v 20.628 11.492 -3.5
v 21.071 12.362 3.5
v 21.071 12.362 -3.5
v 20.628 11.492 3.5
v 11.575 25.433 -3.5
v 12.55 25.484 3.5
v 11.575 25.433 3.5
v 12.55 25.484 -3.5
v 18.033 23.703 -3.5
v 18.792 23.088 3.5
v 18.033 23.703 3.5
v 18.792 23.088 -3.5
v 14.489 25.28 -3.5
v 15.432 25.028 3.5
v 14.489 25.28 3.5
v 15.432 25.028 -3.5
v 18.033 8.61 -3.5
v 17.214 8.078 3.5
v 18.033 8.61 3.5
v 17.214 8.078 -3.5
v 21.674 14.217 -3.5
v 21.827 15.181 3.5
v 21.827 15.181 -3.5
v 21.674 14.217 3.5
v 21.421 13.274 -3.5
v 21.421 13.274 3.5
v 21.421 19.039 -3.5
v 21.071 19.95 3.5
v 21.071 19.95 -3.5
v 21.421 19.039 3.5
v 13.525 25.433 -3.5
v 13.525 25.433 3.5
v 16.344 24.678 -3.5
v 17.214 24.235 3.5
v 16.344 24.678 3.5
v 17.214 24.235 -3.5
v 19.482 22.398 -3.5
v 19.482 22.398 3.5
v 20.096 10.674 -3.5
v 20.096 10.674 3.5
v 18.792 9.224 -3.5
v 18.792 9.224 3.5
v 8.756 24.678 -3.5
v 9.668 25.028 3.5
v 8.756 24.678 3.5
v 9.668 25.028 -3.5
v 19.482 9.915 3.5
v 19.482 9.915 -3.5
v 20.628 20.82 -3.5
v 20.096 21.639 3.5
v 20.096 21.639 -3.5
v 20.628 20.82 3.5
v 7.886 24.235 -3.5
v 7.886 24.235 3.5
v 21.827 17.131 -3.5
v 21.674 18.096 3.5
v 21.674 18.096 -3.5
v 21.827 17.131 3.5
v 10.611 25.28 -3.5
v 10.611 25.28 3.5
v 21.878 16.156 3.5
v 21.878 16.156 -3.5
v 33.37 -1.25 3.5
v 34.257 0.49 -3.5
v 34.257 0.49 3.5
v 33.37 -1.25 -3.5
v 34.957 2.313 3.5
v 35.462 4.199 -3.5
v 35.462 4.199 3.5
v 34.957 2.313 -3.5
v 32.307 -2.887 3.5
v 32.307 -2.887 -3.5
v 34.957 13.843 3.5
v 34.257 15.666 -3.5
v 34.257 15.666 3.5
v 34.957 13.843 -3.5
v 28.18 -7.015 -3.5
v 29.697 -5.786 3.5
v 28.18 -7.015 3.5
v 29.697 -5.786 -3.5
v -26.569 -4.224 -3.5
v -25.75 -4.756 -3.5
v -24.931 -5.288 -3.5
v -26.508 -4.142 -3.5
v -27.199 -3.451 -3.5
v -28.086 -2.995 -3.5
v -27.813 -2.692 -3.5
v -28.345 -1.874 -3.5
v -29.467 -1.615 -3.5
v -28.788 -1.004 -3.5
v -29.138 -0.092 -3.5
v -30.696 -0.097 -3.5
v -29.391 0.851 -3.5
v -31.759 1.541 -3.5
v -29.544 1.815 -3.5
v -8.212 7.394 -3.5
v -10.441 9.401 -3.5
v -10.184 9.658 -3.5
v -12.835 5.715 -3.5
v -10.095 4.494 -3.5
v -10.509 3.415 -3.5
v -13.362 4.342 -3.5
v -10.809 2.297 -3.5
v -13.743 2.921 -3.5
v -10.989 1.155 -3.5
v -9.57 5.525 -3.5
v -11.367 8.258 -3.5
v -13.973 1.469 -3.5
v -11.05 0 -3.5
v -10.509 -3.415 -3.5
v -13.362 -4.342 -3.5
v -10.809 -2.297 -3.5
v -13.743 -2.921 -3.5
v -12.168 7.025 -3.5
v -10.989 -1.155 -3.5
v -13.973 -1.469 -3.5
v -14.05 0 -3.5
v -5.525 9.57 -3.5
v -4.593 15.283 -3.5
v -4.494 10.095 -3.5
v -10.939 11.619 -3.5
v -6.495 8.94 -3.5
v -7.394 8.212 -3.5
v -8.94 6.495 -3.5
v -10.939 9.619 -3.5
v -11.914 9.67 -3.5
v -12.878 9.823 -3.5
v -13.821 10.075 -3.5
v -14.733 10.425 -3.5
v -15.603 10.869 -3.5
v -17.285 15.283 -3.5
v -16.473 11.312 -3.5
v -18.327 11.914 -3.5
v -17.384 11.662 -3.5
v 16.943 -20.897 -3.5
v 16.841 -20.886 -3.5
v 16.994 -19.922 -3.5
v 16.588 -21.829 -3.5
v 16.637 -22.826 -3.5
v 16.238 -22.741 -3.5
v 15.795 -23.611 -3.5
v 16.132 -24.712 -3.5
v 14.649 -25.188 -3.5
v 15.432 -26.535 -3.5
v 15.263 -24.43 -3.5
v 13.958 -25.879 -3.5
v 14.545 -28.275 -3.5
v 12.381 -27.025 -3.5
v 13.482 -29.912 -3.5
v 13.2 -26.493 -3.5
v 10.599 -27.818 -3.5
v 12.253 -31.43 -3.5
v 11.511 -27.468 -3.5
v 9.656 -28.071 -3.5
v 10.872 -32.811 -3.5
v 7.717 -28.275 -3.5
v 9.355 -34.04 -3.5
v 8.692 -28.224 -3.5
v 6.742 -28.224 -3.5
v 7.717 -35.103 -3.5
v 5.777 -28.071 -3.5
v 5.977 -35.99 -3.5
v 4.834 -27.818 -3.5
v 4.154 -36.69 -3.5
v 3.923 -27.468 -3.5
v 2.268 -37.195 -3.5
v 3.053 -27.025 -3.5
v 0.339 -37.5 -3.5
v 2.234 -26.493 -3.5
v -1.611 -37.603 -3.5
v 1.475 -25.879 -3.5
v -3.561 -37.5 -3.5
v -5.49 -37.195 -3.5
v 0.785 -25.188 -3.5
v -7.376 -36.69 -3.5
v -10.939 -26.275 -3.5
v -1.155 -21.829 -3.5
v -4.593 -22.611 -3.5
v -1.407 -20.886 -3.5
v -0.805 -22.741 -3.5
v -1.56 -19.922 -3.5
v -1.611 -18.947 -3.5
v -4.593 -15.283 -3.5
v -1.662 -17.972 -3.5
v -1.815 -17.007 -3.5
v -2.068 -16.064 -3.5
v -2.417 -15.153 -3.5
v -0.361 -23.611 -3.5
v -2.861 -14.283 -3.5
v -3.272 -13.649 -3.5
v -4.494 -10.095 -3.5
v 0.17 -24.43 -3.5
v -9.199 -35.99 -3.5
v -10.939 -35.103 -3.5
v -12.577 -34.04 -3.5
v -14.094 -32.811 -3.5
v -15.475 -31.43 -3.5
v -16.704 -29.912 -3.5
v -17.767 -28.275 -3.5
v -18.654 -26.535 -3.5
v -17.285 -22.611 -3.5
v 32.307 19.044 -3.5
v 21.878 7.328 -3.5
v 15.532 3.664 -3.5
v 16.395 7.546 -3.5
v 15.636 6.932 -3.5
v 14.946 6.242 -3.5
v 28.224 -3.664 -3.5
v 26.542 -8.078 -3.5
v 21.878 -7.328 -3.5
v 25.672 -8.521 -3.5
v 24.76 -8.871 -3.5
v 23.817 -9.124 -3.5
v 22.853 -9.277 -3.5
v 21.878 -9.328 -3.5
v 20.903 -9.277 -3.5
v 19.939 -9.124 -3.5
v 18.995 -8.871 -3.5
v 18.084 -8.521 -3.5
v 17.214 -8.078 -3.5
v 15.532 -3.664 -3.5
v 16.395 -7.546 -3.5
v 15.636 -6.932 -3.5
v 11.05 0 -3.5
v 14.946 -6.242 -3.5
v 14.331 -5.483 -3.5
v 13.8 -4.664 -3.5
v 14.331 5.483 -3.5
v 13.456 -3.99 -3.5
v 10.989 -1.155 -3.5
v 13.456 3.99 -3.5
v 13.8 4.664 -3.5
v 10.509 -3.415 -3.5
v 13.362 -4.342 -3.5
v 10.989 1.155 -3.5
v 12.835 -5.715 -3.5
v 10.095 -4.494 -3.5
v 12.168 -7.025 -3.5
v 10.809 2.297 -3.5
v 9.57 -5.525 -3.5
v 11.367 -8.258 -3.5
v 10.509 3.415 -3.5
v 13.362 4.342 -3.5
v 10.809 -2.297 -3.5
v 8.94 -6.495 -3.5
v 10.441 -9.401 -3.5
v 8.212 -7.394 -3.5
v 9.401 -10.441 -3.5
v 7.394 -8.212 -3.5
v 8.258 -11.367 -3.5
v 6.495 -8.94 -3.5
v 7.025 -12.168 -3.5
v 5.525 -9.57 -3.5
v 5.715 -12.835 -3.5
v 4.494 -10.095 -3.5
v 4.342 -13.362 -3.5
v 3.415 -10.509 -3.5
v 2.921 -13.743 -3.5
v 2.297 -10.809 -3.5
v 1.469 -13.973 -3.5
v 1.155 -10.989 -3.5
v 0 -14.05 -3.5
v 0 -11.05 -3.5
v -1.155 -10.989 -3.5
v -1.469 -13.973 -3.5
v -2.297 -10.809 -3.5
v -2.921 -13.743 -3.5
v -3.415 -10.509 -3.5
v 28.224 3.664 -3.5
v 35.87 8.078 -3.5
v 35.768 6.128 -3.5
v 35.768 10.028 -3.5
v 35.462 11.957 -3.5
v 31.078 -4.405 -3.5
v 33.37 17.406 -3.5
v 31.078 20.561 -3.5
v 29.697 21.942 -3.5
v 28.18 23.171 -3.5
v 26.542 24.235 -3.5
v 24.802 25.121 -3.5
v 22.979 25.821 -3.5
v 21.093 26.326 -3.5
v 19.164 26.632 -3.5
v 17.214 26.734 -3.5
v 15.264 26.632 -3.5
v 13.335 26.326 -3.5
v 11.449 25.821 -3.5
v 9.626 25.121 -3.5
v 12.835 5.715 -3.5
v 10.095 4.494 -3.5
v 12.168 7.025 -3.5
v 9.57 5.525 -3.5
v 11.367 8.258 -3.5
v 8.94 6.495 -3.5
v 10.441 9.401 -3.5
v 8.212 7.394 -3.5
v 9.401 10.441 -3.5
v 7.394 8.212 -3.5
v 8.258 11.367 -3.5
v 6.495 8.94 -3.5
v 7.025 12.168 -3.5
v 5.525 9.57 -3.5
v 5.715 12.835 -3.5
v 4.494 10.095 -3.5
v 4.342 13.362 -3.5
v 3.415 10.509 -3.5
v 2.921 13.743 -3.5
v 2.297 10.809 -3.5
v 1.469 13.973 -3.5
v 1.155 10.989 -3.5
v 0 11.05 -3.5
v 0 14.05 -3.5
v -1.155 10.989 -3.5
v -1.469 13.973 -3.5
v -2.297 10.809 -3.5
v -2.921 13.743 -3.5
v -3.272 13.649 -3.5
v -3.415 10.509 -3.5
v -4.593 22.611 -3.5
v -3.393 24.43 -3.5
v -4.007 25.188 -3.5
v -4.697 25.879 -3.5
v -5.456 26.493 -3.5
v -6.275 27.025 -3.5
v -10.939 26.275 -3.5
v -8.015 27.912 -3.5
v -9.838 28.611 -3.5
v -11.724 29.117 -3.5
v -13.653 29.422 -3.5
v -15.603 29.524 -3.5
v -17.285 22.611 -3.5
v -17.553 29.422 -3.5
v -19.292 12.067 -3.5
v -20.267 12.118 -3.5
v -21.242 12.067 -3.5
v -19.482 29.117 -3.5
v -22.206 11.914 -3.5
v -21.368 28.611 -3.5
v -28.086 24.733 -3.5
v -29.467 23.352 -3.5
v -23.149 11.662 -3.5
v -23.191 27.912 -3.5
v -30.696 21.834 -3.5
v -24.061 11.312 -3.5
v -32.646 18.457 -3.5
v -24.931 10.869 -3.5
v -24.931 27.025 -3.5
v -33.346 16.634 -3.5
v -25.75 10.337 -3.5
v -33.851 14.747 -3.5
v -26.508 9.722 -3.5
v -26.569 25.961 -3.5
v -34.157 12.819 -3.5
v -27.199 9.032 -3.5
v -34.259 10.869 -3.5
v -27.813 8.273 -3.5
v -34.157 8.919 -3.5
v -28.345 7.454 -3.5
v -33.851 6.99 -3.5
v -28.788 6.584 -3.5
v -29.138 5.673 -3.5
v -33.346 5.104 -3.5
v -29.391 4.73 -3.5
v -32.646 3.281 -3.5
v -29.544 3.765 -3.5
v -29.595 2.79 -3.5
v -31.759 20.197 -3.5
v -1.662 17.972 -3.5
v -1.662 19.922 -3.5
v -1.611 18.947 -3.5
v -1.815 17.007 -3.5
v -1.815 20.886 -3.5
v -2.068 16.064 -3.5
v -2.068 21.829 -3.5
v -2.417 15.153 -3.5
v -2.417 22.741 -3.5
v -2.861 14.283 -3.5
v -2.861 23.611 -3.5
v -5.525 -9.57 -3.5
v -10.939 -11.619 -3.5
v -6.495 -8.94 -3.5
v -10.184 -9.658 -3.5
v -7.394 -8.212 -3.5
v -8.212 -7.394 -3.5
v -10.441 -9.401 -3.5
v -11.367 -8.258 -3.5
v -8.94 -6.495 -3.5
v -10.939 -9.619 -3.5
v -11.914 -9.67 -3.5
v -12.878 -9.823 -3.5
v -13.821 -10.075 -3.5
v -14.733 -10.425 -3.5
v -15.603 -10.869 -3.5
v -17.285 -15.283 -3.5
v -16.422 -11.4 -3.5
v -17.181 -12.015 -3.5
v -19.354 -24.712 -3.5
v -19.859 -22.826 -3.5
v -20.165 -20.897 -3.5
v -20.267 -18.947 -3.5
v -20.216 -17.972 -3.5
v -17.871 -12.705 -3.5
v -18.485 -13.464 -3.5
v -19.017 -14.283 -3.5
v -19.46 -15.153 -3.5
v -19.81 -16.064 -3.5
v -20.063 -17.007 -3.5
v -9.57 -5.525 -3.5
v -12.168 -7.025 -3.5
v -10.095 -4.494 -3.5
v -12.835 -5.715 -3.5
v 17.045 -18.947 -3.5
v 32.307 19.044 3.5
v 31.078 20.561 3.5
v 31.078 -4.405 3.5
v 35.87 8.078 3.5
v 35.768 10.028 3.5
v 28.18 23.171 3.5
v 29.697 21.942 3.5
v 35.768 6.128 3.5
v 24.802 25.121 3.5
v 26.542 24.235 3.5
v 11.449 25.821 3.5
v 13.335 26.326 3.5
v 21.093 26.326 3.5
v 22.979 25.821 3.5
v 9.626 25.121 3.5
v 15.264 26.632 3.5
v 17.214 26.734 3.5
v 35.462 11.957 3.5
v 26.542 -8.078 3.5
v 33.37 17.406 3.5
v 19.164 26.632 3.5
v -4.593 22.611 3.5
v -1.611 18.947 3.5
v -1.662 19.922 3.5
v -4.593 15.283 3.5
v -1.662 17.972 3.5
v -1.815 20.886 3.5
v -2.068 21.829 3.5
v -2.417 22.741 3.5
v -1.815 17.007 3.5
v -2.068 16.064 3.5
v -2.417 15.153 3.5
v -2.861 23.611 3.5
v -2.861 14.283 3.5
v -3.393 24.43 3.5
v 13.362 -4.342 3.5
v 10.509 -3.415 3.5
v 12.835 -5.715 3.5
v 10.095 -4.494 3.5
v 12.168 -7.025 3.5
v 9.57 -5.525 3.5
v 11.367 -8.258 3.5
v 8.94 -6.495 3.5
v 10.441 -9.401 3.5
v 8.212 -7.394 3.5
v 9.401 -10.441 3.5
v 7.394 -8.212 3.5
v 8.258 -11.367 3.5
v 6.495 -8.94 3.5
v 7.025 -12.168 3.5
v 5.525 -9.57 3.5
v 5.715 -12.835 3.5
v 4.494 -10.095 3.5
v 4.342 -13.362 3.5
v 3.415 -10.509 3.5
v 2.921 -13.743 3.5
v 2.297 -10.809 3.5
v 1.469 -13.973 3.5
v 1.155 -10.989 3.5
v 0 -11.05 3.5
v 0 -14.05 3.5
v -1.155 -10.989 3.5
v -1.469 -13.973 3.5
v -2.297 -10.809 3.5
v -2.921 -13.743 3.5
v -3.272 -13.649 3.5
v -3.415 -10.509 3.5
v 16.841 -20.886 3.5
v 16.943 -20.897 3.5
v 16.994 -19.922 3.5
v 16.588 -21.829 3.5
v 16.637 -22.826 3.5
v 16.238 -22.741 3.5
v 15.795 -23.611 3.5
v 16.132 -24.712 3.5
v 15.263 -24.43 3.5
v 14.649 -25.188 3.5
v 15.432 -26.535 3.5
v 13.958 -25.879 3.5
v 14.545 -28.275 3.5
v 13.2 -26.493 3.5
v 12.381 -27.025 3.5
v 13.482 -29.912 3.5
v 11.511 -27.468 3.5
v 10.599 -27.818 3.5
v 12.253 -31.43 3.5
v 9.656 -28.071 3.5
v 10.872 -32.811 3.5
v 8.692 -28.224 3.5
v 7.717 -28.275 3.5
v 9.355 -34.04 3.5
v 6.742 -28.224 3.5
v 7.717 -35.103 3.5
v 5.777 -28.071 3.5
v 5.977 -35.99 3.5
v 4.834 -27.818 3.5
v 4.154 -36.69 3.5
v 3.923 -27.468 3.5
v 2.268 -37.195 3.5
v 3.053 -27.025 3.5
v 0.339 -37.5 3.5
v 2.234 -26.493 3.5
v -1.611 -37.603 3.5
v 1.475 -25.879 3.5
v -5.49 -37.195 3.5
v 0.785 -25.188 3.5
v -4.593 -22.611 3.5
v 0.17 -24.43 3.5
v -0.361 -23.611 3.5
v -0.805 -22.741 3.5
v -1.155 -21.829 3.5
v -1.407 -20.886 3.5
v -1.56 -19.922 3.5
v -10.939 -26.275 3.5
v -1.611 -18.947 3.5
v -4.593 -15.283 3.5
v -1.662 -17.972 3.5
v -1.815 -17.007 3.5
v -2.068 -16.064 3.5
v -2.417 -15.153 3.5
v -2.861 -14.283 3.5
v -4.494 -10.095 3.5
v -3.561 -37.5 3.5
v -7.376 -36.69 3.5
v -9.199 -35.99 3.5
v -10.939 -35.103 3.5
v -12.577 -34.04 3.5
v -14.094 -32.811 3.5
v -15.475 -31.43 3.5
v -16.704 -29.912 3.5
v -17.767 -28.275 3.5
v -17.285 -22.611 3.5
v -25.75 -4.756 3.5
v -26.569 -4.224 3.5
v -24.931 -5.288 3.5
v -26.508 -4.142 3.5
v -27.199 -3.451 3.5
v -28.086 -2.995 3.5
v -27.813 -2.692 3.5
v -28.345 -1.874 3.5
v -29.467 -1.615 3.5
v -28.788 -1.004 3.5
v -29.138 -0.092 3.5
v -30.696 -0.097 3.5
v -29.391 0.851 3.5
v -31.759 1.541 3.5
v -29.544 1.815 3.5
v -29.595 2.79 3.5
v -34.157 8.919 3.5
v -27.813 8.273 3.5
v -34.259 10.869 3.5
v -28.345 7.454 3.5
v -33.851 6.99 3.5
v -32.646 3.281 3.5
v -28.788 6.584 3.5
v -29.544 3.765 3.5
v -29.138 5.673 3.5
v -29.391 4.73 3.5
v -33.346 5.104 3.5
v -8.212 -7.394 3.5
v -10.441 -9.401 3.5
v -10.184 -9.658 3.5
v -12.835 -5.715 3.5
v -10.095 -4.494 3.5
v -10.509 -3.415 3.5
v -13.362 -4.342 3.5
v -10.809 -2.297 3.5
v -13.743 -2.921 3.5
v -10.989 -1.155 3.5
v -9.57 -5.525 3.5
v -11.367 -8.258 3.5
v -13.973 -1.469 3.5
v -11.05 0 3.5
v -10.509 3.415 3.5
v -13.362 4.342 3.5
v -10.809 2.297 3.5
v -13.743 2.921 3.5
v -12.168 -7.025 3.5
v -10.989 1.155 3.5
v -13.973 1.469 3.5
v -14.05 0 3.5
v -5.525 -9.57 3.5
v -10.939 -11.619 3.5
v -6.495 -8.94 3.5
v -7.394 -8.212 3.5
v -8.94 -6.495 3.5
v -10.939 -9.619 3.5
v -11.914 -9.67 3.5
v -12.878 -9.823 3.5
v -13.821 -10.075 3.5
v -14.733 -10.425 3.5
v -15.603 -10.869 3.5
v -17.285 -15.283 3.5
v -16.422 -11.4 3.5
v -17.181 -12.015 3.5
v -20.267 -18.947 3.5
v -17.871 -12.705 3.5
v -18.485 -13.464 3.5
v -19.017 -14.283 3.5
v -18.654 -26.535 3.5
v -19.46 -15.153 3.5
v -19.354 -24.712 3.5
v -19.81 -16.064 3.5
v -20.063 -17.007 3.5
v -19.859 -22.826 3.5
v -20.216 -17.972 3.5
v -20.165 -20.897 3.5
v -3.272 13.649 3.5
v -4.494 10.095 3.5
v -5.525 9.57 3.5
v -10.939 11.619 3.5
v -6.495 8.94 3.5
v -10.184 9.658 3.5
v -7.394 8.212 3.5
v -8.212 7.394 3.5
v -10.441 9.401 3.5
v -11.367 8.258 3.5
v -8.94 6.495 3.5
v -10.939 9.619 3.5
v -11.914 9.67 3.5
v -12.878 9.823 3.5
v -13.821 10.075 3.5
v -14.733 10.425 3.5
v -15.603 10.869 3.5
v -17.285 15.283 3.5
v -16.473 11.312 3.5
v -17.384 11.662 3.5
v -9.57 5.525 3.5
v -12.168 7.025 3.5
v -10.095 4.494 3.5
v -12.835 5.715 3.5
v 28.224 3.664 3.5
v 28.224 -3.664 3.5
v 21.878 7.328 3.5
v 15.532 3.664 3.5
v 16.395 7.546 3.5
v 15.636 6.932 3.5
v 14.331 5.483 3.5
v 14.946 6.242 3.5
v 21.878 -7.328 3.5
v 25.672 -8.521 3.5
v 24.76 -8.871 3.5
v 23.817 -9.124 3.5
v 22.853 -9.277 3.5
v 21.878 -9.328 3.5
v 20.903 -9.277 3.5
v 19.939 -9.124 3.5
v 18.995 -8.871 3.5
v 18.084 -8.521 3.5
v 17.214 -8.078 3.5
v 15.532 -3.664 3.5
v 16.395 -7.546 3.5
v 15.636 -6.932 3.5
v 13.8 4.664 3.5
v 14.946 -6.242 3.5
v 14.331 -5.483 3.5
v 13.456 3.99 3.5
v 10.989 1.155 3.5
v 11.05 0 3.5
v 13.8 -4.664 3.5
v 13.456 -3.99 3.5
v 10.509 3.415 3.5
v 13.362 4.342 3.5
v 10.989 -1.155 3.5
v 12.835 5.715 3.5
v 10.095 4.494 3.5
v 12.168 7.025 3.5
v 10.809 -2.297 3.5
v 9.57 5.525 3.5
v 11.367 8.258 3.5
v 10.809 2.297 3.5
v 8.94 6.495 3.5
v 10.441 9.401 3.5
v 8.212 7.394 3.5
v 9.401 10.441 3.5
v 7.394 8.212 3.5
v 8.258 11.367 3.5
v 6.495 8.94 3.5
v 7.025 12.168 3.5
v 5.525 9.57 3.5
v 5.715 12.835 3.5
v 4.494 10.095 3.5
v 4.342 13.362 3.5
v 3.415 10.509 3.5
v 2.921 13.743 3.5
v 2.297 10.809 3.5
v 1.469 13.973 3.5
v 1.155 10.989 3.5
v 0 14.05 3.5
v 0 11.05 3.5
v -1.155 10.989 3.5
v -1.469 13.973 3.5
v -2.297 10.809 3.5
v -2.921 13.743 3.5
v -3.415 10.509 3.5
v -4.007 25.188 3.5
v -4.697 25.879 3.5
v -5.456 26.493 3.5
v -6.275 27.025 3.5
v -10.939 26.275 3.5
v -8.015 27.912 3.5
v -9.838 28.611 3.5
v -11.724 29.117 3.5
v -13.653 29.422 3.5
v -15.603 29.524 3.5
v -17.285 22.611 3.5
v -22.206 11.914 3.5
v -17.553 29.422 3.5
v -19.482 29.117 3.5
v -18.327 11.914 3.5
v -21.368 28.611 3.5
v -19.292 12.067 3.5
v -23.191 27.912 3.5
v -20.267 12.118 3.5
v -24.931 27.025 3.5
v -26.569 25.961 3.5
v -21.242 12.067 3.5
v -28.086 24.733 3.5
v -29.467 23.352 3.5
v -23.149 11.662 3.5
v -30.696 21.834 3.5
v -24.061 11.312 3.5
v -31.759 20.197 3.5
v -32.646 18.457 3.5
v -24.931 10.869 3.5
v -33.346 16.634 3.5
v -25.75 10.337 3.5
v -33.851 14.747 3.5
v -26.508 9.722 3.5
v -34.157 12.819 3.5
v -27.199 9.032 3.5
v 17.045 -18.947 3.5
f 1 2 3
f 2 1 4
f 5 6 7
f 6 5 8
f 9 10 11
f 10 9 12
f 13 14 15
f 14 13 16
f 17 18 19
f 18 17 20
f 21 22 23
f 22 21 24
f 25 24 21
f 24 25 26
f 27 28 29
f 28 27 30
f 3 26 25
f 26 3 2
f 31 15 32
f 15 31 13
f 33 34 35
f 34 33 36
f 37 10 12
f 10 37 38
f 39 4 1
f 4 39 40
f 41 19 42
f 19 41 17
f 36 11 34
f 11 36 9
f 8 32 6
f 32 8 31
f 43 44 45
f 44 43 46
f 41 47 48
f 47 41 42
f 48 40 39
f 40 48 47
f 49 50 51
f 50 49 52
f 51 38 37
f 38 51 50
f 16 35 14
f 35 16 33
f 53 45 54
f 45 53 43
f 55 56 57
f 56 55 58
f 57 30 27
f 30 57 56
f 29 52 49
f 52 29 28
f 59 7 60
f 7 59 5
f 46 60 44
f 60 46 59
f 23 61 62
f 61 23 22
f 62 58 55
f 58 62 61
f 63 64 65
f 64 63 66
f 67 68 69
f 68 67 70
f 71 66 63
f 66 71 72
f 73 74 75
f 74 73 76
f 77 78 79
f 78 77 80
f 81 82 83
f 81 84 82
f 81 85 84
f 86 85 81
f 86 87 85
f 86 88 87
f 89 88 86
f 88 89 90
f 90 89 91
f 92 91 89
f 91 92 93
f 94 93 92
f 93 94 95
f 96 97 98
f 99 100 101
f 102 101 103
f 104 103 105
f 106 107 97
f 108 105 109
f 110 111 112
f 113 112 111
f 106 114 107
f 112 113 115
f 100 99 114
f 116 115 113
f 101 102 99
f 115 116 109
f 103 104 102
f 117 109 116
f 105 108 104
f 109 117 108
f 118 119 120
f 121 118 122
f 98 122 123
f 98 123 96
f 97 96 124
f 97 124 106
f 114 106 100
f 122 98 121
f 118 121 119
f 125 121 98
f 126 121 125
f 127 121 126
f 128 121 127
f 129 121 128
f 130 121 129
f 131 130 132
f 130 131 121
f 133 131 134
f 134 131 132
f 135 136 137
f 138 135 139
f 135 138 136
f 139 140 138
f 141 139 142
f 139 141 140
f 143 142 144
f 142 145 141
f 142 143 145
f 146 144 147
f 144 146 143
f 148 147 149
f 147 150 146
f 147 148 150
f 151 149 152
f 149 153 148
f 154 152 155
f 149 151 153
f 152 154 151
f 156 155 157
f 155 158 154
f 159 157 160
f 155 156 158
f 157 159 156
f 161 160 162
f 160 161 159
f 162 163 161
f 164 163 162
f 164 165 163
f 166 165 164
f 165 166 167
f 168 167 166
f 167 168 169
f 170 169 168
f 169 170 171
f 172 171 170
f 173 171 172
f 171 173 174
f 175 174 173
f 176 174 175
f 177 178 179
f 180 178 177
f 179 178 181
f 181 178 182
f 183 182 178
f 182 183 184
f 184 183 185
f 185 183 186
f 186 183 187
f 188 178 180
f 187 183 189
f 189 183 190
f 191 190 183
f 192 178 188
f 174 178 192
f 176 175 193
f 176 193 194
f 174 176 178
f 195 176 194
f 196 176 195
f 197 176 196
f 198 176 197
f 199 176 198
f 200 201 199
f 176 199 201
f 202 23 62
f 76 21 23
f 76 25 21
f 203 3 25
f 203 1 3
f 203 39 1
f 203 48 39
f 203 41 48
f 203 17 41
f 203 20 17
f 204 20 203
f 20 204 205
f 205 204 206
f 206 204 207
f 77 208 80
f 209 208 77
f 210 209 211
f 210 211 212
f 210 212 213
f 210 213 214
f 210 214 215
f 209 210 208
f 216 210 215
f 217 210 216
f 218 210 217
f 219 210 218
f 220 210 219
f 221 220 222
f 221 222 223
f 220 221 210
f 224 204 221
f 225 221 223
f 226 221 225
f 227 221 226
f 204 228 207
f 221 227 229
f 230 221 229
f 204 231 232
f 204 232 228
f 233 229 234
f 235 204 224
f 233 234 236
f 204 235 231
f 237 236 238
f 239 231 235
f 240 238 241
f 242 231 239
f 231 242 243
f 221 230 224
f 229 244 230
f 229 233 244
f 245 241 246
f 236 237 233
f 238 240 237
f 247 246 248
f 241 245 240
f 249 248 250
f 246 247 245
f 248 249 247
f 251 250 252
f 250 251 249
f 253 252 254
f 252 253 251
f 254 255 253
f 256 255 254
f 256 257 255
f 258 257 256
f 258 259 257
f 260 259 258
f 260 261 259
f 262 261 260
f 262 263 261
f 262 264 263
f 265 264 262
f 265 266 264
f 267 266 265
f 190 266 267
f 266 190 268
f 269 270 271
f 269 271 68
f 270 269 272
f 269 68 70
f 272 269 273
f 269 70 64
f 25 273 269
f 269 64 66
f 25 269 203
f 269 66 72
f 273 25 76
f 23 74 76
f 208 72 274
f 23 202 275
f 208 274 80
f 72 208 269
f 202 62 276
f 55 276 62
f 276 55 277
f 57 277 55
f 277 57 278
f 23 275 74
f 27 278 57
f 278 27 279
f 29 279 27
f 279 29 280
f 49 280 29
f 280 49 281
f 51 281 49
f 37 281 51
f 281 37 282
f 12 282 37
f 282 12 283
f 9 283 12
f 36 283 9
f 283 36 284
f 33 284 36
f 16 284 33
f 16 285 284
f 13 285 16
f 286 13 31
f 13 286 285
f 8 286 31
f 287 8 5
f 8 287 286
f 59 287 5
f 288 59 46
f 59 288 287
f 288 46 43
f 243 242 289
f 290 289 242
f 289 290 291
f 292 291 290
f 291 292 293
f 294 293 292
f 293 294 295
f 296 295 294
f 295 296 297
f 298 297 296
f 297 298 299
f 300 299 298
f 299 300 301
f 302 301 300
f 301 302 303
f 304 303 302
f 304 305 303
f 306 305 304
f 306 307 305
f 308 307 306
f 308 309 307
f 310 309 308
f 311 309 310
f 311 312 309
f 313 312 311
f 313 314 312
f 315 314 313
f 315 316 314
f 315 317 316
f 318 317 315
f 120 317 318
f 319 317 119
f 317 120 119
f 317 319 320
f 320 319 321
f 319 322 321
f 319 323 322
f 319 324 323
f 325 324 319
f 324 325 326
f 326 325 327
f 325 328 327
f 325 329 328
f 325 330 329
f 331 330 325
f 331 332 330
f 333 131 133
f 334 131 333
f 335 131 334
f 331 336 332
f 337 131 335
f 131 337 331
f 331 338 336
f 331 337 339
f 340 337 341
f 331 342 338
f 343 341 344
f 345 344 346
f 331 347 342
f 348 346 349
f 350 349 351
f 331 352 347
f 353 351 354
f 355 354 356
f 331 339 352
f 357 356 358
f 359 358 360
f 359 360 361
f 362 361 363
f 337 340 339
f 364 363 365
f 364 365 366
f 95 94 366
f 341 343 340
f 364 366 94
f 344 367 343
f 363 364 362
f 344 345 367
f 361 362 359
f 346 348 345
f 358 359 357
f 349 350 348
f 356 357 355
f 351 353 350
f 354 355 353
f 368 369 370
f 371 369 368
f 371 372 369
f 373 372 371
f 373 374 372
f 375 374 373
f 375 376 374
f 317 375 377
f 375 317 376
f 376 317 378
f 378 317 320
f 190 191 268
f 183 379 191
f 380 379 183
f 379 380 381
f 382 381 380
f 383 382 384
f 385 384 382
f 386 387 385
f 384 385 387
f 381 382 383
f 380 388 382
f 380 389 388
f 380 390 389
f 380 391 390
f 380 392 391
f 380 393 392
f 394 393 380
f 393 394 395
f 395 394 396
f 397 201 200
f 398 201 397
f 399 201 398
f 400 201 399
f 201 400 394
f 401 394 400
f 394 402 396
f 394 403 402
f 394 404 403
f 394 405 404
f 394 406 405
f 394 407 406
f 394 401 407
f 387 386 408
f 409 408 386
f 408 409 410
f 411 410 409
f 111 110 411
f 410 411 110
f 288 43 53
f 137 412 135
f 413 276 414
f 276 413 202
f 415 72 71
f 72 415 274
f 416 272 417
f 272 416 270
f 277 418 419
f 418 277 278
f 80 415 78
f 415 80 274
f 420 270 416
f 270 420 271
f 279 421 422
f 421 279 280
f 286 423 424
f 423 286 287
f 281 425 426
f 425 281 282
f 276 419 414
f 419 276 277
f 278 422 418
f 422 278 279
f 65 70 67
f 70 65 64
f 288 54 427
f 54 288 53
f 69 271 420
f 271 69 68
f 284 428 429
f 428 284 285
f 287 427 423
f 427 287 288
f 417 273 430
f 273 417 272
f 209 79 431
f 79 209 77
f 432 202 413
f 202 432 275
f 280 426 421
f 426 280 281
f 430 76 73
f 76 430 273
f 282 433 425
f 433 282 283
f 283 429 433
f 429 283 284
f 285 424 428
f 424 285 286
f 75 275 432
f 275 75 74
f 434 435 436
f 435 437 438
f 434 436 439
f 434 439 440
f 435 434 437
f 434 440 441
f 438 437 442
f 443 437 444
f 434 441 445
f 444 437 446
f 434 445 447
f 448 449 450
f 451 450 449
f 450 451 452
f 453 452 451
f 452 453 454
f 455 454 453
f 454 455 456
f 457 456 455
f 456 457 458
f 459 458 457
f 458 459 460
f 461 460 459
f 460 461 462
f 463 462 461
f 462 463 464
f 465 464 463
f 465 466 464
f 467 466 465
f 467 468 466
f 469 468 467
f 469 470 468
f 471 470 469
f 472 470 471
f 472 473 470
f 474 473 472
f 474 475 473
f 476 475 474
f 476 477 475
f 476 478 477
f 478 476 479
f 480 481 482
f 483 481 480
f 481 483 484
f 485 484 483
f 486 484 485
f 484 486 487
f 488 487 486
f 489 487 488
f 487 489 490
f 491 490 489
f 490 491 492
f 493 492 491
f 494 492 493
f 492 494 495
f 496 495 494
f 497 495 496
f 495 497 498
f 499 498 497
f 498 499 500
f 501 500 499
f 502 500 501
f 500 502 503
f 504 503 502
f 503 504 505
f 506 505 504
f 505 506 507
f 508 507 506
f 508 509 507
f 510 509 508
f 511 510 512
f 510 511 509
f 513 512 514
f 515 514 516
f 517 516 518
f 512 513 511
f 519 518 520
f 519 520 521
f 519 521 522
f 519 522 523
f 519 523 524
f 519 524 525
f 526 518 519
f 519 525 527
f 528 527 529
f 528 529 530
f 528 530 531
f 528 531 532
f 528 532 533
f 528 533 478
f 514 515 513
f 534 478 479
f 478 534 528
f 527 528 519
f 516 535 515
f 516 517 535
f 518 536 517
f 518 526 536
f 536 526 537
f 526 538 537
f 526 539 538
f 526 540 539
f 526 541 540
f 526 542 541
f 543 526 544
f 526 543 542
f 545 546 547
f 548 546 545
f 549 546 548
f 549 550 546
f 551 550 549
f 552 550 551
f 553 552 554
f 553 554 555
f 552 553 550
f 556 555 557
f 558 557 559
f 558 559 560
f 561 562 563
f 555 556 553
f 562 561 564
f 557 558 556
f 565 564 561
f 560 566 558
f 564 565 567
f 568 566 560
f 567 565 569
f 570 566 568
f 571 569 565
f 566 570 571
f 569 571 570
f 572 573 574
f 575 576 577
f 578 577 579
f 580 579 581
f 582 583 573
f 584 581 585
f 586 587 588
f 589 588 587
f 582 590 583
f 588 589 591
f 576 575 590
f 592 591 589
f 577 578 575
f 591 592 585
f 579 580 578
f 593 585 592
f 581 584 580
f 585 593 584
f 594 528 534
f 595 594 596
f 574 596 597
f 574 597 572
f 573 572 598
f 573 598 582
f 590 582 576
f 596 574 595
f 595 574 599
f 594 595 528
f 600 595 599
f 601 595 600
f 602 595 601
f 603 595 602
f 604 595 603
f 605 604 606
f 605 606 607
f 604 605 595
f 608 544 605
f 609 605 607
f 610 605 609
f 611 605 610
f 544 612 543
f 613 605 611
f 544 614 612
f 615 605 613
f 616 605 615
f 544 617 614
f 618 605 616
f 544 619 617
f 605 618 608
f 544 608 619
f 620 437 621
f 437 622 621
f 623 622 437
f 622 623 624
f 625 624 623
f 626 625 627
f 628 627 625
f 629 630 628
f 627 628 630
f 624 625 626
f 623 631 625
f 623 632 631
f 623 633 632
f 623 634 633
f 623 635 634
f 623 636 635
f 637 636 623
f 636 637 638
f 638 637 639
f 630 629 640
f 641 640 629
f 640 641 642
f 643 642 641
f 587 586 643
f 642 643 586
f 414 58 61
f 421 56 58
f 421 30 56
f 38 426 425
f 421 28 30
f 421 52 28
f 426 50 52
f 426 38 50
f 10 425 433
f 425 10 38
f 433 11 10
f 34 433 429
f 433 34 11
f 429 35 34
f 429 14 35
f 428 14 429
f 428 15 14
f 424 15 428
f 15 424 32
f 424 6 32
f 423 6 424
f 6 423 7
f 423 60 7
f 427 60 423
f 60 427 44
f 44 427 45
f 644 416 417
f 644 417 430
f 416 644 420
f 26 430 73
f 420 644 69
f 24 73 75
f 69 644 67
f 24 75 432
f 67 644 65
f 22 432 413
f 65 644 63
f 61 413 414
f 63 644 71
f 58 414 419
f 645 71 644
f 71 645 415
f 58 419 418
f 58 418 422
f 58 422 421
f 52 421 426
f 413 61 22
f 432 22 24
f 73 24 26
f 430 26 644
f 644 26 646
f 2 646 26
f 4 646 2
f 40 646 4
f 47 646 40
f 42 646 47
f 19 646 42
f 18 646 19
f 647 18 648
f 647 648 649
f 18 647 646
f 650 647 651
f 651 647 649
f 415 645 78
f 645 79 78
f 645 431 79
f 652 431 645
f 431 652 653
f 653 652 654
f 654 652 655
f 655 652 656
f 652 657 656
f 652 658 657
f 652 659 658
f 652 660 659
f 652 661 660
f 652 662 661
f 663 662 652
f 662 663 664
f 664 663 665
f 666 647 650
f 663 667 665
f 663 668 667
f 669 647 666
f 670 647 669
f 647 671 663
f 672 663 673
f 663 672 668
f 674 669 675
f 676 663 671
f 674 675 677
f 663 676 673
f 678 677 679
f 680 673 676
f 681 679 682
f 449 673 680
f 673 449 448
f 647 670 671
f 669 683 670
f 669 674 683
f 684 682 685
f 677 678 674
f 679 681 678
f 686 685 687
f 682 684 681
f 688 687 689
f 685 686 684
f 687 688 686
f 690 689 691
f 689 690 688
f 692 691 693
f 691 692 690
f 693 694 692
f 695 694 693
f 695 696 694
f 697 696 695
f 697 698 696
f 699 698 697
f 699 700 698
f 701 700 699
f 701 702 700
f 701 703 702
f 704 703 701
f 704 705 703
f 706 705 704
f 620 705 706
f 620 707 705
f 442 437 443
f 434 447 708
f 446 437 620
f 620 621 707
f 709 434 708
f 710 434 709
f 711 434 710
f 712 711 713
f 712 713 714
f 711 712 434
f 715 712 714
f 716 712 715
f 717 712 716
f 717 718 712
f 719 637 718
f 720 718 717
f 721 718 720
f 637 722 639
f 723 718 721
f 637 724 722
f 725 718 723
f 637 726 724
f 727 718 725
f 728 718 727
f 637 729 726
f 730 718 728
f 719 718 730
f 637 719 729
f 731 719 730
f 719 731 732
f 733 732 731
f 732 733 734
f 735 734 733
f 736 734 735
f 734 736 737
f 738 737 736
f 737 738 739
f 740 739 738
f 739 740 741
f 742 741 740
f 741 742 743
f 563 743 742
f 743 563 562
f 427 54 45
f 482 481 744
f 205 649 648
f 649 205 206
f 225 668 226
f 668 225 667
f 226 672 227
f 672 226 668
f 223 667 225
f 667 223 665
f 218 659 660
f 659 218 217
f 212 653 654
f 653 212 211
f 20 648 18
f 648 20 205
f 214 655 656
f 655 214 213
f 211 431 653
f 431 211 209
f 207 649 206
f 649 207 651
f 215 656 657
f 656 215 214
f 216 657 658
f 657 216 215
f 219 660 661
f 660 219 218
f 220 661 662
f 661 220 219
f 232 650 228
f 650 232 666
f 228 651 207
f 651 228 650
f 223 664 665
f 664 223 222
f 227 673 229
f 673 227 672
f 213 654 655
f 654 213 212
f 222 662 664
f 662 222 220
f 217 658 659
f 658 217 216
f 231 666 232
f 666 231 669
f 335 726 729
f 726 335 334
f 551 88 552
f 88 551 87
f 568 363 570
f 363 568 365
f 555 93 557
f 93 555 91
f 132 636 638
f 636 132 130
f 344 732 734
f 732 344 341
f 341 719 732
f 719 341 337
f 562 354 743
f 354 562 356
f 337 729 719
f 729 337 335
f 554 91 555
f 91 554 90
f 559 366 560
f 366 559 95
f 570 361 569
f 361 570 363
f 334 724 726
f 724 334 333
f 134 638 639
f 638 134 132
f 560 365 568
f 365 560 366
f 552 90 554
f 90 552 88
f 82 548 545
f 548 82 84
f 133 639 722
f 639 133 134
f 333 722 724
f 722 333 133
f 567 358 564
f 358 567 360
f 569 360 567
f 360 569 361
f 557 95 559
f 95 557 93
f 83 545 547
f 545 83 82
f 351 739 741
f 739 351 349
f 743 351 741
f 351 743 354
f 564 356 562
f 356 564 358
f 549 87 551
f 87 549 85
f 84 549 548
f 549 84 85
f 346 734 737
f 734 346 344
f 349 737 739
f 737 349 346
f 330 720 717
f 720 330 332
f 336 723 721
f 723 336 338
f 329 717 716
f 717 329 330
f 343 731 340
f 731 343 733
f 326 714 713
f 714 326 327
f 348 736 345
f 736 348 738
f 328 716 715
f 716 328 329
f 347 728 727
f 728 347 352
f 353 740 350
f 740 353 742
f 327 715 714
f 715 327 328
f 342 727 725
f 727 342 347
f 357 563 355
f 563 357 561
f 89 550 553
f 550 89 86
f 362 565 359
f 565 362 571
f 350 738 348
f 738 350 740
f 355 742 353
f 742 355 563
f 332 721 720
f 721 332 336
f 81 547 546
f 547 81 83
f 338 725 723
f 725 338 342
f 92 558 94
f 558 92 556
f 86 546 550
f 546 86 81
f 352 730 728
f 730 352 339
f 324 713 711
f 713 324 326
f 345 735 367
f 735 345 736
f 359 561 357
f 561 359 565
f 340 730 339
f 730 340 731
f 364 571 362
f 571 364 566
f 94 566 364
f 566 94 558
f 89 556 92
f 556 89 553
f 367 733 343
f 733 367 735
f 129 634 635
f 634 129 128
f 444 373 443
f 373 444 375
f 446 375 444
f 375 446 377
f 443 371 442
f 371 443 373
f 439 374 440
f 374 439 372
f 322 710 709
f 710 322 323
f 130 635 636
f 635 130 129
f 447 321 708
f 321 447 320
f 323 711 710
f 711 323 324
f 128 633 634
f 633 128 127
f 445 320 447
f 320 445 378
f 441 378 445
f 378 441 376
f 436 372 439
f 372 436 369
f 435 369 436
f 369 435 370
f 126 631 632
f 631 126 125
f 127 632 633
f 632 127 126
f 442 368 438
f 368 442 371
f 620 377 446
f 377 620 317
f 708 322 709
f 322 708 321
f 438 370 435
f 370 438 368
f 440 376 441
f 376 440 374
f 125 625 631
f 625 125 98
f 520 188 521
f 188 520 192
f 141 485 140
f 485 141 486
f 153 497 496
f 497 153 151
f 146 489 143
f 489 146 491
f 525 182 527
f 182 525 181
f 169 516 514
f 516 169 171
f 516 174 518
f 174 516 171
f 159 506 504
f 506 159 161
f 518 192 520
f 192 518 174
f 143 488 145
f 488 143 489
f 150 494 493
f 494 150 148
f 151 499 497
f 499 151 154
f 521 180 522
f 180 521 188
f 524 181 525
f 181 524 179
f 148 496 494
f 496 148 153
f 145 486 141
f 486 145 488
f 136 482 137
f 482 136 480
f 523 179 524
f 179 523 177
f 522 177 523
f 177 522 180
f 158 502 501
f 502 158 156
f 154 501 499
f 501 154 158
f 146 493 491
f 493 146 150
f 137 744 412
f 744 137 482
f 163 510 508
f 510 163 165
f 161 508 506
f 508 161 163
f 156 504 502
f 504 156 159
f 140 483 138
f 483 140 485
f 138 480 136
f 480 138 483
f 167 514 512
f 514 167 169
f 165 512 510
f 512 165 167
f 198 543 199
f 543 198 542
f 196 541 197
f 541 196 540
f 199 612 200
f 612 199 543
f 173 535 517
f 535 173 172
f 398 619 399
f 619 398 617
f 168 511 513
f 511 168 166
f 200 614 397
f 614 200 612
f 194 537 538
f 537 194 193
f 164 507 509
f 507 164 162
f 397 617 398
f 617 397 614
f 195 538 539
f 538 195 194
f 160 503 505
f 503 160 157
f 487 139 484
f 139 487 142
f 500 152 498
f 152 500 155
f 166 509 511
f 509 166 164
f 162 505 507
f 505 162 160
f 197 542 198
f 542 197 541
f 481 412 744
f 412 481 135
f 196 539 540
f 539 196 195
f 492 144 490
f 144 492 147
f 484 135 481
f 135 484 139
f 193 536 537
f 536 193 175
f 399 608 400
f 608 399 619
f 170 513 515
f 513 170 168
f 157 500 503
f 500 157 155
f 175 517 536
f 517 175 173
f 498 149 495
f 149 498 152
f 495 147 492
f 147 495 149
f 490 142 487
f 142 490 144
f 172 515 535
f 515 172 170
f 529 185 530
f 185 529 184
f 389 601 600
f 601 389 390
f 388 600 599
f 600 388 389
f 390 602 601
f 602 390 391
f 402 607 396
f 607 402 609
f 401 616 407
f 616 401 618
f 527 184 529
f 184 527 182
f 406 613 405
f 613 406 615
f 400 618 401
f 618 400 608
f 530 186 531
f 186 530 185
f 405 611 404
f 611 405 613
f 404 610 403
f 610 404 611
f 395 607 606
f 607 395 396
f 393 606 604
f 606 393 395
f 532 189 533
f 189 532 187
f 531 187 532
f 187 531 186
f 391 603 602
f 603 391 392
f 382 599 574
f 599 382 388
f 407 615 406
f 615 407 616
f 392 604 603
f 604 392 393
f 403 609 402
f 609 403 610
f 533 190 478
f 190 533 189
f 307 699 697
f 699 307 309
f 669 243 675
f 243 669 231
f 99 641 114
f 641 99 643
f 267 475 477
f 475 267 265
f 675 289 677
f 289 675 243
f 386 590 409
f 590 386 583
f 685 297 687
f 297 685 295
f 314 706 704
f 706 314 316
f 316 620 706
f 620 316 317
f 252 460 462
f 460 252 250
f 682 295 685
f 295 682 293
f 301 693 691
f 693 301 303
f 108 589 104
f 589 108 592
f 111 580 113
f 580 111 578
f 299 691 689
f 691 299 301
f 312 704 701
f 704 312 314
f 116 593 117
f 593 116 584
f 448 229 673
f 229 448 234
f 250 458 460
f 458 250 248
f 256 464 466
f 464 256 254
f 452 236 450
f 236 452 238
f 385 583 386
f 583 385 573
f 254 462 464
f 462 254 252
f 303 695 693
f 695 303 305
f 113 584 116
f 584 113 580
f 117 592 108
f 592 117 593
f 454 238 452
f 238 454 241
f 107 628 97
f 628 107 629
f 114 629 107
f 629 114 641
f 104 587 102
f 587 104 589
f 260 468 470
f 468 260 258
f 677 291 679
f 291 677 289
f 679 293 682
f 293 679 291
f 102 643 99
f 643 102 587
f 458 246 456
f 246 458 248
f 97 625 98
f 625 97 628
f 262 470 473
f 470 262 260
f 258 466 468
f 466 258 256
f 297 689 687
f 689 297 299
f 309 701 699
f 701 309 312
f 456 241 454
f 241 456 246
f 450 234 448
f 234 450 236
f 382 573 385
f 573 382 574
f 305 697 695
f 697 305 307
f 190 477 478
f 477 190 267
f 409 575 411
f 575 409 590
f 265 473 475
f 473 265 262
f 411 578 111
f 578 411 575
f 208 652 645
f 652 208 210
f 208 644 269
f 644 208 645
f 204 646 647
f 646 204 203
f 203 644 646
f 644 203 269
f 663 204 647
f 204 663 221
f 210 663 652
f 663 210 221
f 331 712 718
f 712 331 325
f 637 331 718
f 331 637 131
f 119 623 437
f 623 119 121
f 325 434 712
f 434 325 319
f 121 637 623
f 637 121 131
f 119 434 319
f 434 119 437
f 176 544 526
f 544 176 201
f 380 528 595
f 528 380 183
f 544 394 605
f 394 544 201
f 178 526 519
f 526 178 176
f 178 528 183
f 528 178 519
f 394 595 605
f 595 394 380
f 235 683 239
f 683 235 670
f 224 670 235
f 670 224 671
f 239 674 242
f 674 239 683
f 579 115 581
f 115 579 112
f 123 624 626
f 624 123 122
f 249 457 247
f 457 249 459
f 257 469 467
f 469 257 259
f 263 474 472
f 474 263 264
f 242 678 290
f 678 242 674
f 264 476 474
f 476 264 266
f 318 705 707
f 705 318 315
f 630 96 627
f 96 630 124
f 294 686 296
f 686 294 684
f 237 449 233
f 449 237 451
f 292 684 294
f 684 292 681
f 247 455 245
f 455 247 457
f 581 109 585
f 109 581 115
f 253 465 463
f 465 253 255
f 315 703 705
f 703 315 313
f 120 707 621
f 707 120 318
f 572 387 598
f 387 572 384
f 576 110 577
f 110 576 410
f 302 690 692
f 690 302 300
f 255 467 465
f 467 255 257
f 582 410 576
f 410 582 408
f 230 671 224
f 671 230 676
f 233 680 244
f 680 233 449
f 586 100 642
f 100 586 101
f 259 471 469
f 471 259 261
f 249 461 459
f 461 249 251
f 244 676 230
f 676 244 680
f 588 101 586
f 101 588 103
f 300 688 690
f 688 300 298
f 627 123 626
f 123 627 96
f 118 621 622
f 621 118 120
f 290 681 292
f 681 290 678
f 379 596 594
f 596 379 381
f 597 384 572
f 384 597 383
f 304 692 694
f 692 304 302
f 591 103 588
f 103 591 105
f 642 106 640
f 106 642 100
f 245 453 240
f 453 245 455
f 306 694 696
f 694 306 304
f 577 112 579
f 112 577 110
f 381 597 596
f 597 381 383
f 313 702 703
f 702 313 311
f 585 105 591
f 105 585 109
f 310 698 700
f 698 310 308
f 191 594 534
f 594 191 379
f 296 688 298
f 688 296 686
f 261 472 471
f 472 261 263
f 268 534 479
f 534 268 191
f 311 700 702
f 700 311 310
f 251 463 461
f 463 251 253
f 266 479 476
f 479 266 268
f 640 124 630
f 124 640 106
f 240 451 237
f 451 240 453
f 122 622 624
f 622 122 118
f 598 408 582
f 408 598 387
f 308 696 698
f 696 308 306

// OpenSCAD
// lucina
// 2017-02-09

// preview[view:south, tilt:top]

// the number of peripheral objects
objects = 3; //[2,3,4]
// the type of weight
whichWeight = "5/16";   //[bearing, 5/16, M8]
// corner radius in mm; > 0 causes timeout but Create Thing still works
radius = 0;  //[0:.5:3]
// angle of the peripheral objects: 2 objects: use ~120, 4 objects: use ~170
rotation = 150;  //[115:5:170]
/* [Hidden] */
$fn = 60;
x = 0; y = 1; z = 2;
thick = 3;
space = 2;
bearing = [22.1, 22.1, 7];
metric = [15, 13, 7];   // M8 hex nut
sae = [.577*25.4, .5 * 25.4, 7]; // 5/16 hex nut
weight = (whichWeight == "bearing") ? bearing : (whichWeight == "5/16") ? sae : metric;
echo(whichWeight, weight[x], weight[y], weight[z]);
step = 360 / objects;
stop = (objects-1) * step;
outerR = weight[x]+2*space-radius;
resolution = ( whichWeight == "bearing" ) ? 40 : 6;

module yin(rad) {
   translate([0, -outerR/2, 0])
      minkowski() {
      union() {
         difference() {
            cylinder(h = bearing[z]-2*rad, r = outerR, center = true);
            union() {
               translate([0, -(outerR/2), 0])
                  cylinder(h = bearing[z]*2, r = outerR/2, center=true);
               translate([outerR/2, 0, 0])
                  cube([outerR, 2*outerR, 2*bearing[z]], center=true);
            }
         }
         translate([0, outerR/2, 0])
            cylinder(h = bearing[z]-2*rad, r = outerR/2, center=true);
      }
      sphere(rad);
   }
}

module fcylinder(z, x, rad) {
   translate([0, 0, rad-z/2])
      minkowski() {
         cylinder(h=z-2*rad, d=x-2*rad);
         sphere(rad);
      }
}
difference() {
   union() {
      fcylinder(bearing[z], bearing[x]+2*thick, radius);
      for ( angle = [0 : step : stop] ) {
         rotate([0, 0, angle])
            translate([bearing[x]/2 + thick/2 + outerR/2, 0, 0])
               rotate([0, 0, -rotation])
                  yin(radius);
      }
   }
   // holes
   union() {
      cylinder(h=2*bearing[z], d=bearing[x], center=true);
      for ( angle = [0 : step : stop] ) {
         rotate([0, 0, angle])
            translate([bearing[x]/2 + thick/2 + outerR/2, 0, 0])
               rotate([0, 0, 30])
                  cylinder(h=2*bearing[z], d=weight[x], center=true, $fn=resolution);
      }
   }
}
